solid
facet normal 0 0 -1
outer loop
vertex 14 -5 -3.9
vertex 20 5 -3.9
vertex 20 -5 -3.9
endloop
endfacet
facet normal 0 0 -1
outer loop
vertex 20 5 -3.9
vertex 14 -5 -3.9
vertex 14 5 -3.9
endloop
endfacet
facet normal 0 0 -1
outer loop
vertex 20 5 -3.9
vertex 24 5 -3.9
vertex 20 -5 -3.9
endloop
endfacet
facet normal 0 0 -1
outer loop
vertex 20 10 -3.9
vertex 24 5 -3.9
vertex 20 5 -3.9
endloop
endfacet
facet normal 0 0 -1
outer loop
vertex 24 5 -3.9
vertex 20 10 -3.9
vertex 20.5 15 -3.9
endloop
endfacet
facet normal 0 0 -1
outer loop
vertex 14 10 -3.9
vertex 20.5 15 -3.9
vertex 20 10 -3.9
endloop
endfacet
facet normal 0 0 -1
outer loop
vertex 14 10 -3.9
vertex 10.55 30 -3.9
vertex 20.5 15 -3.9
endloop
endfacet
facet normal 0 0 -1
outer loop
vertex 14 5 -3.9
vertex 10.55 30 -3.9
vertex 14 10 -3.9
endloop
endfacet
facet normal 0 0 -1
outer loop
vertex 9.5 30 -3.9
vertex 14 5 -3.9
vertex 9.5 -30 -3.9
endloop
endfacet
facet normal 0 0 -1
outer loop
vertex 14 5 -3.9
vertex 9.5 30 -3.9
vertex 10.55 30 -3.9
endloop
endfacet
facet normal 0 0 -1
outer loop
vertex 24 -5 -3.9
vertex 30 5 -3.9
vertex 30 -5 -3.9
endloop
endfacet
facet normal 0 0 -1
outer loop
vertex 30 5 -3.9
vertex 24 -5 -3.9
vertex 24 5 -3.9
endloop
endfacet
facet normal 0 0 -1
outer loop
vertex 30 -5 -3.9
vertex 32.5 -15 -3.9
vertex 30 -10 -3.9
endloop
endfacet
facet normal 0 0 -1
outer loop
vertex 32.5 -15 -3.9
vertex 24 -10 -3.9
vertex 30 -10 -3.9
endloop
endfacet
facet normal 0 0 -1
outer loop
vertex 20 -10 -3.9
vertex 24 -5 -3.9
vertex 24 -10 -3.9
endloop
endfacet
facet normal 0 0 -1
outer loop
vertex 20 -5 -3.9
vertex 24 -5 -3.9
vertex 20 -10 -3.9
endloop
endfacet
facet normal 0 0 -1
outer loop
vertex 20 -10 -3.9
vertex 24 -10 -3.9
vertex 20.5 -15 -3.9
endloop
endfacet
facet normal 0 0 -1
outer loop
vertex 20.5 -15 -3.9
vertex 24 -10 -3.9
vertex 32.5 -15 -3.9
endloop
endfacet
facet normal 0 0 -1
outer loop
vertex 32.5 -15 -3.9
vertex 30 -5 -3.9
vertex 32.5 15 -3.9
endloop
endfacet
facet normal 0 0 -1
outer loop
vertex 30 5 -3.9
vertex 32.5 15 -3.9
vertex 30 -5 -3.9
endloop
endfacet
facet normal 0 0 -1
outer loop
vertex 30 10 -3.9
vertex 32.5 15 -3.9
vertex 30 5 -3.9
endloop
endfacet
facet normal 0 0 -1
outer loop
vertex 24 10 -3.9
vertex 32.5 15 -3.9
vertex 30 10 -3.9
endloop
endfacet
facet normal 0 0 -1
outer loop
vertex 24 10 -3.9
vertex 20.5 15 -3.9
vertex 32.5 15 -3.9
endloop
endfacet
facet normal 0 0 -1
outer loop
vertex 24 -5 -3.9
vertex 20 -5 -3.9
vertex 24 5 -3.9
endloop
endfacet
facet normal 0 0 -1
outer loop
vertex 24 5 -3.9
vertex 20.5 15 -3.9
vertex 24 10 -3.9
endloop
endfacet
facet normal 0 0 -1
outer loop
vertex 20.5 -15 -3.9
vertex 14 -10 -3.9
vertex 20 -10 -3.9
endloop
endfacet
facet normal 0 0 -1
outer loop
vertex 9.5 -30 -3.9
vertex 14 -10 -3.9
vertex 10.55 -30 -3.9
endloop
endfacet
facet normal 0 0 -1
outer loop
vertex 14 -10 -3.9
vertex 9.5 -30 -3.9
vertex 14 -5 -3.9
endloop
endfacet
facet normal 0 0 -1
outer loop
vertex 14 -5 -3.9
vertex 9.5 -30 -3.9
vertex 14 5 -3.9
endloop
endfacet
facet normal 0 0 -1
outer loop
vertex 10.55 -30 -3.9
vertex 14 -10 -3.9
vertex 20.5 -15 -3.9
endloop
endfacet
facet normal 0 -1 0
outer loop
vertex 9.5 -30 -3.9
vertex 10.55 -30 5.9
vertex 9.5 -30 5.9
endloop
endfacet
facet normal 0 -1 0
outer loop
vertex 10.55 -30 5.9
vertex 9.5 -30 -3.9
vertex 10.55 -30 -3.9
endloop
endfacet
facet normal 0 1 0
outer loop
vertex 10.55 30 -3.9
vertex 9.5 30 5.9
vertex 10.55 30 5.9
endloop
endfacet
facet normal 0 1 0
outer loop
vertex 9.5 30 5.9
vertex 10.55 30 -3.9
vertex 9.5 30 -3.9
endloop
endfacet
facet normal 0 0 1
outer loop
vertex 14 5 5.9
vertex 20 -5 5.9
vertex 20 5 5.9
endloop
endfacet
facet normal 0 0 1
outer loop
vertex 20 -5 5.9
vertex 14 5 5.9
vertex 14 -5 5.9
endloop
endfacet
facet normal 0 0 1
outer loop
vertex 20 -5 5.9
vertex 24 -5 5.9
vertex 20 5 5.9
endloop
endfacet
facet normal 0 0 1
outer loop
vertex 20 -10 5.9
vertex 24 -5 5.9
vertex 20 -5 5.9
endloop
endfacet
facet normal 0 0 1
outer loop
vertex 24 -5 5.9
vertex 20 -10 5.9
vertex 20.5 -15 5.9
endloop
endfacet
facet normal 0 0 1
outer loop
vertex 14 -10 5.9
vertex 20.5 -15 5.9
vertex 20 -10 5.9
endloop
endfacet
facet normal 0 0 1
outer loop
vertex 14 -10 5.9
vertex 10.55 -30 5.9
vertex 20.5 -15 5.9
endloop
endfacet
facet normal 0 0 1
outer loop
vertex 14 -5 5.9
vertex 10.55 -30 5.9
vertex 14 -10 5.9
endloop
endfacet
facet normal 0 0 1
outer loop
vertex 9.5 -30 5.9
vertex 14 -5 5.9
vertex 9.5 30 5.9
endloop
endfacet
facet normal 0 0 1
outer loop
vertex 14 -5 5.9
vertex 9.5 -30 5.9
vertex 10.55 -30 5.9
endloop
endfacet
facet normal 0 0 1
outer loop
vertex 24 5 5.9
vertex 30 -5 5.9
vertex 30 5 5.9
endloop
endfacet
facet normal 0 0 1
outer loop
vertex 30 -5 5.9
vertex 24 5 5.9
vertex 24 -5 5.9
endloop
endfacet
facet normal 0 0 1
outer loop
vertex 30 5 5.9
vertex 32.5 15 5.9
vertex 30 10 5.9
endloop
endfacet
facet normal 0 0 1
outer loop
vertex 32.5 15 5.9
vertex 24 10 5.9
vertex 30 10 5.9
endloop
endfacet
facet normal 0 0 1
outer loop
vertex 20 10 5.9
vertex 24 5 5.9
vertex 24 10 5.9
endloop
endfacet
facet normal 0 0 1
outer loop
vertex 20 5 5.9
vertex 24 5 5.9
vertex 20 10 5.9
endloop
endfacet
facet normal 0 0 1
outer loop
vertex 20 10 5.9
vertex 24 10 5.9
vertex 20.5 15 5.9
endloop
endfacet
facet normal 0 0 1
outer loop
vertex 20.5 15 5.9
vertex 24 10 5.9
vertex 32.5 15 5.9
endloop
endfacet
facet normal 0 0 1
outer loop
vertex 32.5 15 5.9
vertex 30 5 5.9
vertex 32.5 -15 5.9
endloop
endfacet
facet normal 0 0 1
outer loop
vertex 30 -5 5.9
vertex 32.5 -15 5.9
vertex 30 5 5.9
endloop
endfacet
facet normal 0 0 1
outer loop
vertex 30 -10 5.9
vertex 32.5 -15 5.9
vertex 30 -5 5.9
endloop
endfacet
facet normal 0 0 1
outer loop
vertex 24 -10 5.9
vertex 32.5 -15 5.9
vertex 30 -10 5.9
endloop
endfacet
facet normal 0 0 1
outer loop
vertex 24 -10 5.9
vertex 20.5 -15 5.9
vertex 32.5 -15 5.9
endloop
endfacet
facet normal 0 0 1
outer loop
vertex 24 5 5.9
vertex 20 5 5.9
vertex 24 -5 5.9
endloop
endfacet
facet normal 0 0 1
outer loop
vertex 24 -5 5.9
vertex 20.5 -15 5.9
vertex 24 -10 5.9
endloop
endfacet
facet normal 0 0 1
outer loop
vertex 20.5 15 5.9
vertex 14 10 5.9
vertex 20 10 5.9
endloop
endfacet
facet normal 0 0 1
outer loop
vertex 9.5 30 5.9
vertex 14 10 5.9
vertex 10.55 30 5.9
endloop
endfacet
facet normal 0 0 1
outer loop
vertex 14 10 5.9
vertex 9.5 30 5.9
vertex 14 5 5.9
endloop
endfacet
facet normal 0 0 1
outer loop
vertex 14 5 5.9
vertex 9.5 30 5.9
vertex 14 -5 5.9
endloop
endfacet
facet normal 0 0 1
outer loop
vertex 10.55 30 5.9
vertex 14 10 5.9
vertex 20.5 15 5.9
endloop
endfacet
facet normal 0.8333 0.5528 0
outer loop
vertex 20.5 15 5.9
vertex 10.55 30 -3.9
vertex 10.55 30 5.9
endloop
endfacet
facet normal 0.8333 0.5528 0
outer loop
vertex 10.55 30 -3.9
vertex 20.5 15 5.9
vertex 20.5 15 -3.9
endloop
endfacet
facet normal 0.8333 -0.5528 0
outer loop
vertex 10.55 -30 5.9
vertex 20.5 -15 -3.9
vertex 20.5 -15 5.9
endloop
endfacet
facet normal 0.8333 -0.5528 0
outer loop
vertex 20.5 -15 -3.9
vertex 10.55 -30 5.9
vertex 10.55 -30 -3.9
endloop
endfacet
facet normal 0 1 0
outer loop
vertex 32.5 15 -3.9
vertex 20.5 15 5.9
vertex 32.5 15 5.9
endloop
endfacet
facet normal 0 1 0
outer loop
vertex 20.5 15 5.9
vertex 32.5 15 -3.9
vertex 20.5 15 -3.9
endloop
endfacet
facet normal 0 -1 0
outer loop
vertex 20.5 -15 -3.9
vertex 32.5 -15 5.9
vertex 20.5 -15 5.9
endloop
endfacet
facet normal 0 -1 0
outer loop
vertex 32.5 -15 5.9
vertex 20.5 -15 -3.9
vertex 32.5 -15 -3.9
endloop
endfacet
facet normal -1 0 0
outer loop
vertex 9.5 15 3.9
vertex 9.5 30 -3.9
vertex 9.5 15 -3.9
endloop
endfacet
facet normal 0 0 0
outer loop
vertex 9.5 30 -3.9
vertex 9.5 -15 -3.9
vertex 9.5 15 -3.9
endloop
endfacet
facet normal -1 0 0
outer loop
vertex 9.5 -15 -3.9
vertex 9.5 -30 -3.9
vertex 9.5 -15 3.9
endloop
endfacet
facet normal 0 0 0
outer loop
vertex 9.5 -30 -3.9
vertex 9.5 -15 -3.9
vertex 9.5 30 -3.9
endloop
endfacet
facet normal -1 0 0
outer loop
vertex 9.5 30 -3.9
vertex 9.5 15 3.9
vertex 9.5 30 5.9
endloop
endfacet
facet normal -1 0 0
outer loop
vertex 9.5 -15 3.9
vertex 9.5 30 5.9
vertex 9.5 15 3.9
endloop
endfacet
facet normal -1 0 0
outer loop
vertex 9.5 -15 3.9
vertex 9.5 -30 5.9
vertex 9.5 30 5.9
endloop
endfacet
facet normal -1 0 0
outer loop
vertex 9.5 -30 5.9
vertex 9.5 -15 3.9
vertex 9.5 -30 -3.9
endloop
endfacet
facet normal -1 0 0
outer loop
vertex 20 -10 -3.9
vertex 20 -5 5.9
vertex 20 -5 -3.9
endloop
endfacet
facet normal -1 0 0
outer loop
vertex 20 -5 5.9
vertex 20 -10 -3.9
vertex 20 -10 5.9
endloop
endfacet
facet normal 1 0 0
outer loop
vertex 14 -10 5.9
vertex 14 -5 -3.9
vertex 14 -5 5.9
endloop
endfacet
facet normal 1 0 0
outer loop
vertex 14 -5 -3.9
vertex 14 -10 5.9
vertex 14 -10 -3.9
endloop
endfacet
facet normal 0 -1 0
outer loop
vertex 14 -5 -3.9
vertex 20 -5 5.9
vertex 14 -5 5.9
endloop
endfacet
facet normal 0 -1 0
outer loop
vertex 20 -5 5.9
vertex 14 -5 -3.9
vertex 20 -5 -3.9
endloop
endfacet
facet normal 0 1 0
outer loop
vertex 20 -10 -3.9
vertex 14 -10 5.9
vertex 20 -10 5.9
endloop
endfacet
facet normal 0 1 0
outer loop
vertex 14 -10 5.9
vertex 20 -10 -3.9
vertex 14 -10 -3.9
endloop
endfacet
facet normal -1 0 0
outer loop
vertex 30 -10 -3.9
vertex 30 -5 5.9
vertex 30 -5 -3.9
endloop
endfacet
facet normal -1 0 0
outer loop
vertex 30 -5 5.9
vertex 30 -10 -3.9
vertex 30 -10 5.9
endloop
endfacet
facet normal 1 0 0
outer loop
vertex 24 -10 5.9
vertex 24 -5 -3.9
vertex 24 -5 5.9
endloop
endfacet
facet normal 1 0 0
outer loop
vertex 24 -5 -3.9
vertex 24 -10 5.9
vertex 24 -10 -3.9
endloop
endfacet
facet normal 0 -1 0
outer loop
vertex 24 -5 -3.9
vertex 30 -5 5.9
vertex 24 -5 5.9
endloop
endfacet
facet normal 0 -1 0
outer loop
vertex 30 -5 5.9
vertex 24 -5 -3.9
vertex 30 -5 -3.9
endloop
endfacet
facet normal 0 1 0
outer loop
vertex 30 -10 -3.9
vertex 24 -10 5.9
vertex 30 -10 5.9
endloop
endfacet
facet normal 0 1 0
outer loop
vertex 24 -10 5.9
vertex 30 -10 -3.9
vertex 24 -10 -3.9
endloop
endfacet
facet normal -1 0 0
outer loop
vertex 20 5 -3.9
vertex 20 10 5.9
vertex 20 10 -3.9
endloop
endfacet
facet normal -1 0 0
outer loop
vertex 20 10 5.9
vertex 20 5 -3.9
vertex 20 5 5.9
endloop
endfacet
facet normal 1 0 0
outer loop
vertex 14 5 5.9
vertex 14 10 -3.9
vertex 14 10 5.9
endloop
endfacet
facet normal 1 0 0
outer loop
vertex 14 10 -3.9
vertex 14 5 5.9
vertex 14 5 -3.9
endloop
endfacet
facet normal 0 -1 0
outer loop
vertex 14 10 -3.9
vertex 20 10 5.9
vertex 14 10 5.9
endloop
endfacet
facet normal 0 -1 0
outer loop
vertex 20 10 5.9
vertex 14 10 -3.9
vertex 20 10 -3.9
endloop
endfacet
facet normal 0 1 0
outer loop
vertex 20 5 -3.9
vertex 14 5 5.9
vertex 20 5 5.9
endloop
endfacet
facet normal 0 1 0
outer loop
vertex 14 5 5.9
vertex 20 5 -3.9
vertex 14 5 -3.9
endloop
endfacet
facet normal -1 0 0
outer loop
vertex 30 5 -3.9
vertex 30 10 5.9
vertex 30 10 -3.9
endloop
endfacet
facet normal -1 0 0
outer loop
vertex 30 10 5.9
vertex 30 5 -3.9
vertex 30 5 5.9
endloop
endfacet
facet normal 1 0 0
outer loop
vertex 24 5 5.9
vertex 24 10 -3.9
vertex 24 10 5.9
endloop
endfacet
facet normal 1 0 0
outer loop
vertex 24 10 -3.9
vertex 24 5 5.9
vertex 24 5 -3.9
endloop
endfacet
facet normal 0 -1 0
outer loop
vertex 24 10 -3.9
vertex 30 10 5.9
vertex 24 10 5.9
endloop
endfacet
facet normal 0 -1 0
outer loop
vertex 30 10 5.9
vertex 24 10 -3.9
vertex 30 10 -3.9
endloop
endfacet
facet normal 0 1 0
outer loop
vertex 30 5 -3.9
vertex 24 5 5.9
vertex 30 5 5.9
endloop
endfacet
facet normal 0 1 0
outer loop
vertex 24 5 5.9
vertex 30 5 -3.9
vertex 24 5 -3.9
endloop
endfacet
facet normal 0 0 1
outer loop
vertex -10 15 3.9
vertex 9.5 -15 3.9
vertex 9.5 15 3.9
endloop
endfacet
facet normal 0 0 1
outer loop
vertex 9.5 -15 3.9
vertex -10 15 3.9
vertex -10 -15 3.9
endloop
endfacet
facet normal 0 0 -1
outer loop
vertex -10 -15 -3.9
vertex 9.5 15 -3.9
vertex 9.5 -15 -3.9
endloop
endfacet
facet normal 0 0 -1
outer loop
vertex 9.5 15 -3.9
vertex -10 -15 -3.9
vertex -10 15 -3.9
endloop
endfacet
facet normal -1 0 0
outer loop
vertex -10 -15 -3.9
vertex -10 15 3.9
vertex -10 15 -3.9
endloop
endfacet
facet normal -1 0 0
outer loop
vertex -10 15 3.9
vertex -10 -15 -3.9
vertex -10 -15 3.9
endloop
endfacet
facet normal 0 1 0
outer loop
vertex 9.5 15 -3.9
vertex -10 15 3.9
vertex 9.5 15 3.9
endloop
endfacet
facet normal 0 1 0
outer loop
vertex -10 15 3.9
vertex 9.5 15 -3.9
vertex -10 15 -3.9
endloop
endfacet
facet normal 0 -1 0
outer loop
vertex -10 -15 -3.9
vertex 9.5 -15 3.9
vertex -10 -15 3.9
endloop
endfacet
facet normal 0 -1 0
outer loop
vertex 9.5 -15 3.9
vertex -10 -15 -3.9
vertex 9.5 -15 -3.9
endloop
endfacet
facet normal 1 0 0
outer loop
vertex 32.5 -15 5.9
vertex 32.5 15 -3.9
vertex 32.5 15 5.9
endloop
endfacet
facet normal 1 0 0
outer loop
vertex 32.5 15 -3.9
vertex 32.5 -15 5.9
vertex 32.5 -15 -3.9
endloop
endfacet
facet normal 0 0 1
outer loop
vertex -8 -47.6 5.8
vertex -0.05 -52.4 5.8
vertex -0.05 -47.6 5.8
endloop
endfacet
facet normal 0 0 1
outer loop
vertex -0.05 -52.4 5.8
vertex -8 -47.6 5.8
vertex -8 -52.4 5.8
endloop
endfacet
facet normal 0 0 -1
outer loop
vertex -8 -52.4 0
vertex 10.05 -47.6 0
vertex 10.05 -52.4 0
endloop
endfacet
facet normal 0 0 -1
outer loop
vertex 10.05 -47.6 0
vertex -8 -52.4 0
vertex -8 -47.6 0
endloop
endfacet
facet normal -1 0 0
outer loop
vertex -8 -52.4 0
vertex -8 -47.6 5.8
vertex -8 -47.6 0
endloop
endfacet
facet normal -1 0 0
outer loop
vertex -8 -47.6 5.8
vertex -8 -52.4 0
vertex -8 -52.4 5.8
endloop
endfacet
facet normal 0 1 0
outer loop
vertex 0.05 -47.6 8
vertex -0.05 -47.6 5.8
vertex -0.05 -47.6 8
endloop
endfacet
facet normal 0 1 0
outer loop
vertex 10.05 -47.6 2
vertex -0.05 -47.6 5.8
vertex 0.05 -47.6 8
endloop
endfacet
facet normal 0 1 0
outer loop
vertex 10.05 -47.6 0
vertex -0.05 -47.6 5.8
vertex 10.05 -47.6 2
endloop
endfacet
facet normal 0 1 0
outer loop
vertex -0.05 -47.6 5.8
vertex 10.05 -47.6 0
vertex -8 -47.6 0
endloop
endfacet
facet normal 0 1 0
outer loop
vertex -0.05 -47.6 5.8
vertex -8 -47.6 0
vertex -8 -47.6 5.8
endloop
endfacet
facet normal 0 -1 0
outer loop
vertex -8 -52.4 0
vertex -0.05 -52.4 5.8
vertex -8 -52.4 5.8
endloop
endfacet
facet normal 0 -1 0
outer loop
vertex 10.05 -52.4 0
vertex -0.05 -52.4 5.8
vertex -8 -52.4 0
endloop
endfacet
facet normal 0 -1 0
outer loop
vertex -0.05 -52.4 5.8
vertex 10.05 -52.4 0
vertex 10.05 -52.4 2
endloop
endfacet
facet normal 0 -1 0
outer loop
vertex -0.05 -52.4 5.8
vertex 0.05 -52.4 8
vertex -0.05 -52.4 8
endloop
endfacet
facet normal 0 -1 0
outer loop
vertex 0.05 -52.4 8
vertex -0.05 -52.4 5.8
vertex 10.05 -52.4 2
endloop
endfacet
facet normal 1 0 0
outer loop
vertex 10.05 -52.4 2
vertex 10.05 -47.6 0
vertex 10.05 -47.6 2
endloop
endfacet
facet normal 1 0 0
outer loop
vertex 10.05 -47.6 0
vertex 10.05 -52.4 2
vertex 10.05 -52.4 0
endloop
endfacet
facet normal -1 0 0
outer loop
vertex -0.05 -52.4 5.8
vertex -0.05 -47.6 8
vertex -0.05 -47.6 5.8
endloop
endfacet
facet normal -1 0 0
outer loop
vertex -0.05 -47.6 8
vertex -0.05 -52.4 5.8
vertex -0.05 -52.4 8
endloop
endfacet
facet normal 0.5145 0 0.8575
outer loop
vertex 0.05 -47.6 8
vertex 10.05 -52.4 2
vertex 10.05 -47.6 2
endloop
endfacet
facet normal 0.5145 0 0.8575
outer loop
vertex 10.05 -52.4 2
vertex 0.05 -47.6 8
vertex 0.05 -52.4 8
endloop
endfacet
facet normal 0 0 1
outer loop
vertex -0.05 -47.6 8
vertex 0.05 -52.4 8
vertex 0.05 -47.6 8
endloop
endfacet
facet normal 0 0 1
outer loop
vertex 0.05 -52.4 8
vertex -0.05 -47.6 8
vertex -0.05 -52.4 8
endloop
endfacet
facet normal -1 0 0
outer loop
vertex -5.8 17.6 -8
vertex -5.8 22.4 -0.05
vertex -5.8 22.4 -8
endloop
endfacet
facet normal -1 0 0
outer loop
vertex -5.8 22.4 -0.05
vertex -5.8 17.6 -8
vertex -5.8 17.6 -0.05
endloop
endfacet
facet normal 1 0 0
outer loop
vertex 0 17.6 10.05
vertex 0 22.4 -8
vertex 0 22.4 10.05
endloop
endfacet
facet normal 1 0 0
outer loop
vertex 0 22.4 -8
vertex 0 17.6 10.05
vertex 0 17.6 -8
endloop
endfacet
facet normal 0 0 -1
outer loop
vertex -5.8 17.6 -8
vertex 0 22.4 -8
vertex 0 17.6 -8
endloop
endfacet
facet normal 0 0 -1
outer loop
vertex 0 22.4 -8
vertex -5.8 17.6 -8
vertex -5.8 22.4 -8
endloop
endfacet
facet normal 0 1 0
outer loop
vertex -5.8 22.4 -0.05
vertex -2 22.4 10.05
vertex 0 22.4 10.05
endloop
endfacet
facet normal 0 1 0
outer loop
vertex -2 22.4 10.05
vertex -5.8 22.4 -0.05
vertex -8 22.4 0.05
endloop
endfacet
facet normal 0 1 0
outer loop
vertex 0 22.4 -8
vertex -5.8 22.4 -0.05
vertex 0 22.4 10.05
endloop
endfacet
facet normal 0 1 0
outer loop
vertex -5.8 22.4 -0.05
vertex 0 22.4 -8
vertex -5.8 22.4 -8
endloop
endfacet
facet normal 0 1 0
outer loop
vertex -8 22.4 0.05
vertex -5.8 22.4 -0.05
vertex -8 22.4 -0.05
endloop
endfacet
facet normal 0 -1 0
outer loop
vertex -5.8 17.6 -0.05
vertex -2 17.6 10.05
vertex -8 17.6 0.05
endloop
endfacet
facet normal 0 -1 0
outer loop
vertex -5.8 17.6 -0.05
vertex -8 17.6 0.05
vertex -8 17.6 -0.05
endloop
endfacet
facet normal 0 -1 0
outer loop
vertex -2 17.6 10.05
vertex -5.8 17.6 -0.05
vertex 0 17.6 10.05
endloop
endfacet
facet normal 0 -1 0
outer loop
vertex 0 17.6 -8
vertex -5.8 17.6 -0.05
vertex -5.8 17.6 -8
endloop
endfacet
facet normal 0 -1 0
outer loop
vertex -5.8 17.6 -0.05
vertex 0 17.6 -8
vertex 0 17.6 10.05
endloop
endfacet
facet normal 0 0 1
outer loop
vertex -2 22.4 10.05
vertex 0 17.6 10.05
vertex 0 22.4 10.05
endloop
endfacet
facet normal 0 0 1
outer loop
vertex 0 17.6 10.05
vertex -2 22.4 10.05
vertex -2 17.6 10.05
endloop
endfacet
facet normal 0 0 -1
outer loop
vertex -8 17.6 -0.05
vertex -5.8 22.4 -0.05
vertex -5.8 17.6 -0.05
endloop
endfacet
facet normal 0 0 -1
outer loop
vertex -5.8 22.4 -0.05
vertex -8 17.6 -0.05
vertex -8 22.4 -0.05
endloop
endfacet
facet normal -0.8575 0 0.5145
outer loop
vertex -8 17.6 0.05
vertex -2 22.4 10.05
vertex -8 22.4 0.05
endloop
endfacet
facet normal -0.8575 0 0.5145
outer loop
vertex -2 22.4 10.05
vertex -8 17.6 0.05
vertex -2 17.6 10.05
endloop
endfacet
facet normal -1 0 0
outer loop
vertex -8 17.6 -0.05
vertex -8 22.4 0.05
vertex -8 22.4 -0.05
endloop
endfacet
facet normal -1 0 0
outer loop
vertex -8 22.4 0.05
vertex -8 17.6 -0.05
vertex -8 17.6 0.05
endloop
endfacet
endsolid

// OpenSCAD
// file: tab.scad
include <../../lib/relativity.scad> // https://github.com/davidson16807/relativity.scad

module tab() {
  box([8, 4.8, 5.8], anchor=bottom+x, $class="tab")
  align(x)
  hulled()
  align(bottom)
  box([0.1, $parent_size.y, 8], anchor=bottom)
  translated(x*10)
  align(bottom)
  box([0.1, $parent_size.y, 2], anchor=bottom);
}

translated(-y*50)
tab();
// file: body.scad
include <../../lib/relativity.scad> // https://github.com/davidson16807/relativity.scad

module body() {
  width=30;
  height=7.8;
  differed("hole", "body,guard")
    box([20, width, height])
    align(bottom+x) {
      box([1, $parent_size.y+30, $parent_size.z+2], anchor=bottom, $class="guard")
      align(bottom+x)
      hulled(class="guard")
      box([0.1, $parent_size.y, $parent_size.z], anchor=bottom, $class="guard")
      align(bottom)
      box([10, width, $parent_size.z], anchor=bottom-x)
      align(bottom+x)
      box([73, width, $parent_size.z], anchor=bottom-x, $class="body")
      ;
      translated(y*7.5, [-1,1])
      translated(x*10, [1:8])
      colored("red")
      box([6, 5, height+10], anchor=bottom+x, $class="hole")
      ;
    }

}

intersected("cut", "not(cut)") {
  box([65, 100, 50], $class="cut");
  body();
}
// main file
include <body.scad>
include <tab.scad>

translated(y*20)
rotated(-y*90) 
colored("red")
tab();
